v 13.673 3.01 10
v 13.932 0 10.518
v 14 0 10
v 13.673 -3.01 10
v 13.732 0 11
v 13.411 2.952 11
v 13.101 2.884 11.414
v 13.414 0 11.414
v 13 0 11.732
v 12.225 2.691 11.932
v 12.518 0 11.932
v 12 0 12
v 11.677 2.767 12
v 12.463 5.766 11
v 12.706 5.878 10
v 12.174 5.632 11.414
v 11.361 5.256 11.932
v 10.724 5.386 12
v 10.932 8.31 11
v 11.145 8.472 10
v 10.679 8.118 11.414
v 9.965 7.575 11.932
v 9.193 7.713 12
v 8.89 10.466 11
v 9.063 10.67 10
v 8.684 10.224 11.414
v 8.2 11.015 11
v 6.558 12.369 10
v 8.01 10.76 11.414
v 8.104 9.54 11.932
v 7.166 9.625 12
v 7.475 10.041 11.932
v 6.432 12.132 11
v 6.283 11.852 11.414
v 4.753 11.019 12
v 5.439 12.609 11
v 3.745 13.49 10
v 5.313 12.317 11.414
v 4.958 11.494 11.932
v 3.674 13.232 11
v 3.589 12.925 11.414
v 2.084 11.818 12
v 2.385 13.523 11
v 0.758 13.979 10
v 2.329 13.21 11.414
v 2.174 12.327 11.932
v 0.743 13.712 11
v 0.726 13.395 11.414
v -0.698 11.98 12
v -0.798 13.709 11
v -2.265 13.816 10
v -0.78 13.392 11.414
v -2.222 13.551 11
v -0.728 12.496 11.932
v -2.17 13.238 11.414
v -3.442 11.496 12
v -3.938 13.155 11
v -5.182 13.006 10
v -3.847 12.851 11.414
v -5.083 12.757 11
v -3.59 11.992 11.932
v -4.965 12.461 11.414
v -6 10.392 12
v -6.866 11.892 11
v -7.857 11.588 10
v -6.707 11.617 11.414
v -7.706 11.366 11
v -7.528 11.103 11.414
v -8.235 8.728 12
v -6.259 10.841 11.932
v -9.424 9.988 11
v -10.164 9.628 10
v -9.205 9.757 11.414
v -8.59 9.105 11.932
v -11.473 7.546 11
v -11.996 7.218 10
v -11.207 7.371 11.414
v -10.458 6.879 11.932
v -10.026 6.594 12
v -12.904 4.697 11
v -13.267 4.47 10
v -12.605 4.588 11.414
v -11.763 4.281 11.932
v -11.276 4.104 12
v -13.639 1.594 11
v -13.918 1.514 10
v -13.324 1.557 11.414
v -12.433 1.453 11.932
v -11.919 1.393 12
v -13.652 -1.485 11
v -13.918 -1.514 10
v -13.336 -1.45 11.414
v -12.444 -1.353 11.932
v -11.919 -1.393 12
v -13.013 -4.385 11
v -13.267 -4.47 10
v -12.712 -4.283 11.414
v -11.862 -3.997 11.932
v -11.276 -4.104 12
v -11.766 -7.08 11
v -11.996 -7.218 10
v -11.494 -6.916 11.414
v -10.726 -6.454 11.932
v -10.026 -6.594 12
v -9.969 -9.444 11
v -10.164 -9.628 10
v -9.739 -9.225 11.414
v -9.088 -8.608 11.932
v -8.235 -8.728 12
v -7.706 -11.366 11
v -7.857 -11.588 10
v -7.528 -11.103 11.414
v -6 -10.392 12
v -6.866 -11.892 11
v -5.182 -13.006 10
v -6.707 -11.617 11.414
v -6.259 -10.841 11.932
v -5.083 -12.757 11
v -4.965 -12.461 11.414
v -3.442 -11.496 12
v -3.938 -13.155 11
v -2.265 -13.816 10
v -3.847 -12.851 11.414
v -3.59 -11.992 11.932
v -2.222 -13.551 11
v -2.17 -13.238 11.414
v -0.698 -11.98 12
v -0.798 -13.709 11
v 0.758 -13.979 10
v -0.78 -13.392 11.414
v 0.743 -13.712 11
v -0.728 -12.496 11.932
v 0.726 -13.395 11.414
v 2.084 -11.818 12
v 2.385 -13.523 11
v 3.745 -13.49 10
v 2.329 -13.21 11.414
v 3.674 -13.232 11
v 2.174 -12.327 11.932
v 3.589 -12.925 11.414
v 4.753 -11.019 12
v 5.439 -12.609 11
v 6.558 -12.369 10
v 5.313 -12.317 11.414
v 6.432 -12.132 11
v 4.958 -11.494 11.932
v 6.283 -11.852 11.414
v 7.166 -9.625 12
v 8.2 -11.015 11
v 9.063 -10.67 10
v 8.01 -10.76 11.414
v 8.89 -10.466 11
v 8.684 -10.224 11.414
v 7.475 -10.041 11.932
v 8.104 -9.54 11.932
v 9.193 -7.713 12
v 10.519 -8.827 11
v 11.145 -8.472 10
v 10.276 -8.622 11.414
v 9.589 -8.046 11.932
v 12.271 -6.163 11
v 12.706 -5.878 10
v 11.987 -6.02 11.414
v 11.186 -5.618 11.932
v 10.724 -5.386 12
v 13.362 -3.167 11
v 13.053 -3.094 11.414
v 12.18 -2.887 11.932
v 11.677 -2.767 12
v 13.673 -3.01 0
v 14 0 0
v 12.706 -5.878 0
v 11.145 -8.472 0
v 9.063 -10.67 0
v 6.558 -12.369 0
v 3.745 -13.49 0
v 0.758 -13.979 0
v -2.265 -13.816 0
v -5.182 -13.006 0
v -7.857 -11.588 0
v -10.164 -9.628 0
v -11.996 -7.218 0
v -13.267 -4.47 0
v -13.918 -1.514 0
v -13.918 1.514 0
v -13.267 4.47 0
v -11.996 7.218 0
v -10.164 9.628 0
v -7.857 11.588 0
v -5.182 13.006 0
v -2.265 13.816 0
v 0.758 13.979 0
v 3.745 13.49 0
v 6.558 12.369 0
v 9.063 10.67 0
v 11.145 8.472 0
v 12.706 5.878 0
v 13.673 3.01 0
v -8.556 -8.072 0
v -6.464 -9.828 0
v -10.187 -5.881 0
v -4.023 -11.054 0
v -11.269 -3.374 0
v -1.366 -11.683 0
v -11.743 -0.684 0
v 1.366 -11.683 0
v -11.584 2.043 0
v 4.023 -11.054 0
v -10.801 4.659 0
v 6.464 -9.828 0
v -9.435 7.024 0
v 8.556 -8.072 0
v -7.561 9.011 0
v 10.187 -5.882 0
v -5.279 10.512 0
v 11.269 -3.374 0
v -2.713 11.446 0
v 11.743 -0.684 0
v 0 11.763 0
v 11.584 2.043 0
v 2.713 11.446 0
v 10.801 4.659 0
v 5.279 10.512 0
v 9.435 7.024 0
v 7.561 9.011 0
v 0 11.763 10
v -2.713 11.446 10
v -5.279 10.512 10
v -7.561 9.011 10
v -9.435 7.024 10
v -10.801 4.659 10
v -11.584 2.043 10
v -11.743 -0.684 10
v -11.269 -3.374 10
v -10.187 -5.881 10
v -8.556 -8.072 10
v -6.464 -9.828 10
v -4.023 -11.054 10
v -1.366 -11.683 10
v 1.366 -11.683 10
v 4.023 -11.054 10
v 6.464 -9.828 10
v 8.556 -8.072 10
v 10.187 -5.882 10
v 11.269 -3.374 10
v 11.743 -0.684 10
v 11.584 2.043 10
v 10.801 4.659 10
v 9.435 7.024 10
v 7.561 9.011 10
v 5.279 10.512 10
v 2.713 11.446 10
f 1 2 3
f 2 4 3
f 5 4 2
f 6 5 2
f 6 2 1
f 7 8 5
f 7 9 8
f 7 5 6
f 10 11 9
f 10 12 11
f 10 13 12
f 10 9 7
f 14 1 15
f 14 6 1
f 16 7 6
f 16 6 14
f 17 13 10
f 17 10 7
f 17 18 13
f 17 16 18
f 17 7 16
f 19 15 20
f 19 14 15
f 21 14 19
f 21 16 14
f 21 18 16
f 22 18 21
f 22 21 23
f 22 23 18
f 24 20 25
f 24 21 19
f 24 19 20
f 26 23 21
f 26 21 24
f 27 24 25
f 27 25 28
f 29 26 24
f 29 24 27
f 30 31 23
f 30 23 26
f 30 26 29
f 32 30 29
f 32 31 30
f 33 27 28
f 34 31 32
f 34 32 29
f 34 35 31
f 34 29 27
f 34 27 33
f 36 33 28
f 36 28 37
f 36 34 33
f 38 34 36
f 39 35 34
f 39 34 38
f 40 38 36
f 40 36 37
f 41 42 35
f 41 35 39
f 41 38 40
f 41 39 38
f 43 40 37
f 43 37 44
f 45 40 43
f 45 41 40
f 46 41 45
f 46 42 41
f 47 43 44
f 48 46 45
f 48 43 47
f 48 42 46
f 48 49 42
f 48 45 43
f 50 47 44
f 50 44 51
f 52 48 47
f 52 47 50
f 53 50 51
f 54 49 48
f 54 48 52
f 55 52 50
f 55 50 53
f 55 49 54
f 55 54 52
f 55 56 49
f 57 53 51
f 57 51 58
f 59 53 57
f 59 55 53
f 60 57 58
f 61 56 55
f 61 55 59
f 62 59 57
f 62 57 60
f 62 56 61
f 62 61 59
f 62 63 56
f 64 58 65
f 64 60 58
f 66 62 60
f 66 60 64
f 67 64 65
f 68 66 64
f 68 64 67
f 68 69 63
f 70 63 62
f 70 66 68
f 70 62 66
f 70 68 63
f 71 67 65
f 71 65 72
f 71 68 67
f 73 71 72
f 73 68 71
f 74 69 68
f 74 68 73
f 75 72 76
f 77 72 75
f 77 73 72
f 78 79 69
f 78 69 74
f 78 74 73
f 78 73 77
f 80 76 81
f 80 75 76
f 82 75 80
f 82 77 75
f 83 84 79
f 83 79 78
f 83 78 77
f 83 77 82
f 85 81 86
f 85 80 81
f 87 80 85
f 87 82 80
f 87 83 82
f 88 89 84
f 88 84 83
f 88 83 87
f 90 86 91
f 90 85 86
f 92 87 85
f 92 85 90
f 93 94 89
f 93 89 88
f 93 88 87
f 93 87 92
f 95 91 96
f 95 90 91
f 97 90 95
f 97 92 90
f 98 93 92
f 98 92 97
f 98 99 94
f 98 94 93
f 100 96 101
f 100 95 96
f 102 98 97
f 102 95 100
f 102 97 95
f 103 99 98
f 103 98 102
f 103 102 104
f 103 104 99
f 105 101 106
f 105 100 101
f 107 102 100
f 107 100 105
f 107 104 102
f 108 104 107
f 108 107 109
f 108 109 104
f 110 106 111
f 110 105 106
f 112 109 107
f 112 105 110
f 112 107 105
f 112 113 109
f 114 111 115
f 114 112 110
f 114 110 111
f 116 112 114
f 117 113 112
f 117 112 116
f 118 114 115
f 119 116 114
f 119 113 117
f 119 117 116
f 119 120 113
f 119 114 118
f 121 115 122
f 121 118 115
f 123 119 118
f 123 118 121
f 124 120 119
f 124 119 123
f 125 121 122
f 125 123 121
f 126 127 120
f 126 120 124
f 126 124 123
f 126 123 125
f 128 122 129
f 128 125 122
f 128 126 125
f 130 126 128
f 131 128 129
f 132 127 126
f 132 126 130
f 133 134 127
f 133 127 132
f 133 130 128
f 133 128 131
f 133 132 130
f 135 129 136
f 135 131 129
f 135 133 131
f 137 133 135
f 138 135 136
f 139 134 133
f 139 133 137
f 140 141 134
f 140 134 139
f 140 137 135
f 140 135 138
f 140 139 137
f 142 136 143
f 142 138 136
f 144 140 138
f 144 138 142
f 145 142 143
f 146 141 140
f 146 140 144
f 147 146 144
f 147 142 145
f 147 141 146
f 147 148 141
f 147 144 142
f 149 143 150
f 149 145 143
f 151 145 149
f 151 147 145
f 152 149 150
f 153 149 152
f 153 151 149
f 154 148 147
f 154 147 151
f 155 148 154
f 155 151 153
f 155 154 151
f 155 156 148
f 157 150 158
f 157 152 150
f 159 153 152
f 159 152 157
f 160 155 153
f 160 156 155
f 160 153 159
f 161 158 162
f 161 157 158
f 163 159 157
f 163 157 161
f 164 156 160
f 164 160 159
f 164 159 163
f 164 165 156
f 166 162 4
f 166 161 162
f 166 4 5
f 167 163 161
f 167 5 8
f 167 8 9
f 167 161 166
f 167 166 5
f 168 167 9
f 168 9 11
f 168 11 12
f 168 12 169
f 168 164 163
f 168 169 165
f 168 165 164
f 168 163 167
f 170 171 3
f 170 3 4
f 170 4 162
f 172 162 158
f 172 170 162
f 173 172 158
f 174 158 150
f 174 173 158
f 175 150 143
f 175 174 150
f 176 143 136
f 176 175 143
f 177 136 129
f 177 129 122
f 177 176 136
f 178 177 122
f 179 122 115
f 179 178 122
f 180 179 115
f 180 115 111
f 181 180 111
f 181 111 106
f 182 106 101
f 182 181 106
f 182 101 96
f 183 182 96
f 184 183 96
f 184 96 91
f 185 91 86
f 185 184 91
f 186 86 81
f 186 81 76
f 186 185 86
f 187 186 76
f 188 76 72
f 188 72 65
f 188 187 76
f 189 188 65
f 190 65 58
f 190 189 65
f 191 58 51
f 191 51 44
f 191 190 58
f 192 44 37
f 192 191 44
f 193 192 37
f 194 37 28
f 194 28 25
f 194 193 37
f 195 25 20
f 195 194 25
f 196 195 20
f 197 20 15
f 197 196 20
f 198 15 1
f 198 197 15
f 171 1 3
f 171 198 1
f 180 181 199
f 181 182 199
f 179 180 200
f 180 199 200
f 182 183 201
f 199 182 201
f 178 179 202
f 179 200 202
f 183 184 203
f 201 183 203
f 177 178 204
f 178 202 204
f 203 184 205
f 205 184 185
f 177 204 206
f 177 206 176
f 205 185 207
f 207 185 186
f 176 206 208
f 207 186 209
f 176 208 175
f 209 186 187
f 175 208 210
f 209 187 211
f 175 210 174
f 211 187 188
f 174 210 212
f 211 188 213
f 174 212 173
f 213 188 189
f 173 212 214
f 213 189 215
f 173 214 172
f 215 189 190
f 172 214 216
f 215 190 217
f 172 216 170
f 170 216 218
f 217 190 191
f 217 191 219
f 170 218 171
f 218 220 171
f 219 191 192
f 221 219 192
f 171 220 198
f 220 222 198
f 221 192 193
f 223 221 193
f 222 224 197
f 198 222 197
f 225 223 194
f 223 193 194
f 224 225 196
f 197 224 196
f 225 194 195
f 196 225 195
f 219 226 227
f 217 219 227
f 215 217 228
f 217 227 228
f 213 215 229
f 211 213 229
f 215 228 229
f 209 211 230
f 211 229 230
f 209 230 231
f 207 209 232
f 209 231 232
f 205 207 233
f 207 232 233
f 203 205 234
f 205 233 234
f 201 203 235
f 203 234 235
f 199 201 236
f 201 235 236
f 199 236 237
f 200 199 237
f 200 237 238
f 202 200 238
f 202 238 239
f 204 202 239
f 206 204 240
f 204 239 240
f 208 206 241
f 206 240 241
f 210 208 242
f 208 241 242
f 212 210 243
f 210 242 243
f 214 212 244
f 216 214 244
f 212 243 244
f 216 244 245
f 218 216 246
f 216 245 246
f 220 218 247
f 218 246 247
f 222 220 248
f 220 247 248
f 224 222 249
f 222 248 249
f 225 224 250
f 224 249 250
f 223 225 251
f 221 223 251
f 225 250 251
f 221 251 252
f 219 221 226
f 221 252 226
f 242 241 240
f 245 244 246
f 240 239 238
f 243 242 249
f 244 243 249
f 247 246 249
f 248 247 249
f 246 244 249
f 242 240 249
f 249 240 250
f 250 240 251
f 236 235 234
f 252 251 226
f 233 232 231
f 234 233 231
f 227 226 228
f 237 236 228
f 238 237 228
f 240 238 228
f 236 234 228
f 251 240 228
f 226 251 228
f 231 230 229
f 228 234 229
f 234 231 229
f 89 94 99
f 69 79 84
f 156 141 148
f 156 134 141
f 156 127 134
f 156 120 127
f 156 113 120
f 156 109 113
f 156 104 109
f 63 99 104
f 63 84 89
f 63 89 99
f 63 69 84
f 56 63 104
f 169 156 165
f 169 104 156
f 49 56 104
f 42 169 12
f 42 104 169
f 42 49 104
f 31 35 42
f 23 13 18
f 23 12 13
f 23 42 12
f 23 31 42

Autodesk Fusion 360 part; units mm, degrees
sketch "Sketch1" plane through (0, 0, 0) normal (0, 0, 1) x (1, 0, 0)
  circle A0 centre (0, 0) radius 14
  dimension "d1" = 28
extrude "Extrude1" add sketch "Sketch1" along normal blind 12
sketch "Sketch4" plane through (0, 0, 0) normal (0, 0, -1) x (1, 0, 0)
  circle A0 centre (0, 0) radius 14
  circle A1 centre (0, 0) radius 12.5
  dimension "d5" = 25
hole "Hole1" at (0, 0, 0) direction (0, 0, 1) diameter 25 depth 10 tip angle 180
thread "Thread1" "ISO Metric profile 25.0 M25x1.5 M25x1.5 6H" major diameter 25.208 minor diameter 23.526 pitch 1.5 angle 60 resizes the face on face at (0.6231, 12.4845, 3.3333)
fillet "Fillet1" radius 2 1 edges at (-13.0526, -5.0626, 12)
